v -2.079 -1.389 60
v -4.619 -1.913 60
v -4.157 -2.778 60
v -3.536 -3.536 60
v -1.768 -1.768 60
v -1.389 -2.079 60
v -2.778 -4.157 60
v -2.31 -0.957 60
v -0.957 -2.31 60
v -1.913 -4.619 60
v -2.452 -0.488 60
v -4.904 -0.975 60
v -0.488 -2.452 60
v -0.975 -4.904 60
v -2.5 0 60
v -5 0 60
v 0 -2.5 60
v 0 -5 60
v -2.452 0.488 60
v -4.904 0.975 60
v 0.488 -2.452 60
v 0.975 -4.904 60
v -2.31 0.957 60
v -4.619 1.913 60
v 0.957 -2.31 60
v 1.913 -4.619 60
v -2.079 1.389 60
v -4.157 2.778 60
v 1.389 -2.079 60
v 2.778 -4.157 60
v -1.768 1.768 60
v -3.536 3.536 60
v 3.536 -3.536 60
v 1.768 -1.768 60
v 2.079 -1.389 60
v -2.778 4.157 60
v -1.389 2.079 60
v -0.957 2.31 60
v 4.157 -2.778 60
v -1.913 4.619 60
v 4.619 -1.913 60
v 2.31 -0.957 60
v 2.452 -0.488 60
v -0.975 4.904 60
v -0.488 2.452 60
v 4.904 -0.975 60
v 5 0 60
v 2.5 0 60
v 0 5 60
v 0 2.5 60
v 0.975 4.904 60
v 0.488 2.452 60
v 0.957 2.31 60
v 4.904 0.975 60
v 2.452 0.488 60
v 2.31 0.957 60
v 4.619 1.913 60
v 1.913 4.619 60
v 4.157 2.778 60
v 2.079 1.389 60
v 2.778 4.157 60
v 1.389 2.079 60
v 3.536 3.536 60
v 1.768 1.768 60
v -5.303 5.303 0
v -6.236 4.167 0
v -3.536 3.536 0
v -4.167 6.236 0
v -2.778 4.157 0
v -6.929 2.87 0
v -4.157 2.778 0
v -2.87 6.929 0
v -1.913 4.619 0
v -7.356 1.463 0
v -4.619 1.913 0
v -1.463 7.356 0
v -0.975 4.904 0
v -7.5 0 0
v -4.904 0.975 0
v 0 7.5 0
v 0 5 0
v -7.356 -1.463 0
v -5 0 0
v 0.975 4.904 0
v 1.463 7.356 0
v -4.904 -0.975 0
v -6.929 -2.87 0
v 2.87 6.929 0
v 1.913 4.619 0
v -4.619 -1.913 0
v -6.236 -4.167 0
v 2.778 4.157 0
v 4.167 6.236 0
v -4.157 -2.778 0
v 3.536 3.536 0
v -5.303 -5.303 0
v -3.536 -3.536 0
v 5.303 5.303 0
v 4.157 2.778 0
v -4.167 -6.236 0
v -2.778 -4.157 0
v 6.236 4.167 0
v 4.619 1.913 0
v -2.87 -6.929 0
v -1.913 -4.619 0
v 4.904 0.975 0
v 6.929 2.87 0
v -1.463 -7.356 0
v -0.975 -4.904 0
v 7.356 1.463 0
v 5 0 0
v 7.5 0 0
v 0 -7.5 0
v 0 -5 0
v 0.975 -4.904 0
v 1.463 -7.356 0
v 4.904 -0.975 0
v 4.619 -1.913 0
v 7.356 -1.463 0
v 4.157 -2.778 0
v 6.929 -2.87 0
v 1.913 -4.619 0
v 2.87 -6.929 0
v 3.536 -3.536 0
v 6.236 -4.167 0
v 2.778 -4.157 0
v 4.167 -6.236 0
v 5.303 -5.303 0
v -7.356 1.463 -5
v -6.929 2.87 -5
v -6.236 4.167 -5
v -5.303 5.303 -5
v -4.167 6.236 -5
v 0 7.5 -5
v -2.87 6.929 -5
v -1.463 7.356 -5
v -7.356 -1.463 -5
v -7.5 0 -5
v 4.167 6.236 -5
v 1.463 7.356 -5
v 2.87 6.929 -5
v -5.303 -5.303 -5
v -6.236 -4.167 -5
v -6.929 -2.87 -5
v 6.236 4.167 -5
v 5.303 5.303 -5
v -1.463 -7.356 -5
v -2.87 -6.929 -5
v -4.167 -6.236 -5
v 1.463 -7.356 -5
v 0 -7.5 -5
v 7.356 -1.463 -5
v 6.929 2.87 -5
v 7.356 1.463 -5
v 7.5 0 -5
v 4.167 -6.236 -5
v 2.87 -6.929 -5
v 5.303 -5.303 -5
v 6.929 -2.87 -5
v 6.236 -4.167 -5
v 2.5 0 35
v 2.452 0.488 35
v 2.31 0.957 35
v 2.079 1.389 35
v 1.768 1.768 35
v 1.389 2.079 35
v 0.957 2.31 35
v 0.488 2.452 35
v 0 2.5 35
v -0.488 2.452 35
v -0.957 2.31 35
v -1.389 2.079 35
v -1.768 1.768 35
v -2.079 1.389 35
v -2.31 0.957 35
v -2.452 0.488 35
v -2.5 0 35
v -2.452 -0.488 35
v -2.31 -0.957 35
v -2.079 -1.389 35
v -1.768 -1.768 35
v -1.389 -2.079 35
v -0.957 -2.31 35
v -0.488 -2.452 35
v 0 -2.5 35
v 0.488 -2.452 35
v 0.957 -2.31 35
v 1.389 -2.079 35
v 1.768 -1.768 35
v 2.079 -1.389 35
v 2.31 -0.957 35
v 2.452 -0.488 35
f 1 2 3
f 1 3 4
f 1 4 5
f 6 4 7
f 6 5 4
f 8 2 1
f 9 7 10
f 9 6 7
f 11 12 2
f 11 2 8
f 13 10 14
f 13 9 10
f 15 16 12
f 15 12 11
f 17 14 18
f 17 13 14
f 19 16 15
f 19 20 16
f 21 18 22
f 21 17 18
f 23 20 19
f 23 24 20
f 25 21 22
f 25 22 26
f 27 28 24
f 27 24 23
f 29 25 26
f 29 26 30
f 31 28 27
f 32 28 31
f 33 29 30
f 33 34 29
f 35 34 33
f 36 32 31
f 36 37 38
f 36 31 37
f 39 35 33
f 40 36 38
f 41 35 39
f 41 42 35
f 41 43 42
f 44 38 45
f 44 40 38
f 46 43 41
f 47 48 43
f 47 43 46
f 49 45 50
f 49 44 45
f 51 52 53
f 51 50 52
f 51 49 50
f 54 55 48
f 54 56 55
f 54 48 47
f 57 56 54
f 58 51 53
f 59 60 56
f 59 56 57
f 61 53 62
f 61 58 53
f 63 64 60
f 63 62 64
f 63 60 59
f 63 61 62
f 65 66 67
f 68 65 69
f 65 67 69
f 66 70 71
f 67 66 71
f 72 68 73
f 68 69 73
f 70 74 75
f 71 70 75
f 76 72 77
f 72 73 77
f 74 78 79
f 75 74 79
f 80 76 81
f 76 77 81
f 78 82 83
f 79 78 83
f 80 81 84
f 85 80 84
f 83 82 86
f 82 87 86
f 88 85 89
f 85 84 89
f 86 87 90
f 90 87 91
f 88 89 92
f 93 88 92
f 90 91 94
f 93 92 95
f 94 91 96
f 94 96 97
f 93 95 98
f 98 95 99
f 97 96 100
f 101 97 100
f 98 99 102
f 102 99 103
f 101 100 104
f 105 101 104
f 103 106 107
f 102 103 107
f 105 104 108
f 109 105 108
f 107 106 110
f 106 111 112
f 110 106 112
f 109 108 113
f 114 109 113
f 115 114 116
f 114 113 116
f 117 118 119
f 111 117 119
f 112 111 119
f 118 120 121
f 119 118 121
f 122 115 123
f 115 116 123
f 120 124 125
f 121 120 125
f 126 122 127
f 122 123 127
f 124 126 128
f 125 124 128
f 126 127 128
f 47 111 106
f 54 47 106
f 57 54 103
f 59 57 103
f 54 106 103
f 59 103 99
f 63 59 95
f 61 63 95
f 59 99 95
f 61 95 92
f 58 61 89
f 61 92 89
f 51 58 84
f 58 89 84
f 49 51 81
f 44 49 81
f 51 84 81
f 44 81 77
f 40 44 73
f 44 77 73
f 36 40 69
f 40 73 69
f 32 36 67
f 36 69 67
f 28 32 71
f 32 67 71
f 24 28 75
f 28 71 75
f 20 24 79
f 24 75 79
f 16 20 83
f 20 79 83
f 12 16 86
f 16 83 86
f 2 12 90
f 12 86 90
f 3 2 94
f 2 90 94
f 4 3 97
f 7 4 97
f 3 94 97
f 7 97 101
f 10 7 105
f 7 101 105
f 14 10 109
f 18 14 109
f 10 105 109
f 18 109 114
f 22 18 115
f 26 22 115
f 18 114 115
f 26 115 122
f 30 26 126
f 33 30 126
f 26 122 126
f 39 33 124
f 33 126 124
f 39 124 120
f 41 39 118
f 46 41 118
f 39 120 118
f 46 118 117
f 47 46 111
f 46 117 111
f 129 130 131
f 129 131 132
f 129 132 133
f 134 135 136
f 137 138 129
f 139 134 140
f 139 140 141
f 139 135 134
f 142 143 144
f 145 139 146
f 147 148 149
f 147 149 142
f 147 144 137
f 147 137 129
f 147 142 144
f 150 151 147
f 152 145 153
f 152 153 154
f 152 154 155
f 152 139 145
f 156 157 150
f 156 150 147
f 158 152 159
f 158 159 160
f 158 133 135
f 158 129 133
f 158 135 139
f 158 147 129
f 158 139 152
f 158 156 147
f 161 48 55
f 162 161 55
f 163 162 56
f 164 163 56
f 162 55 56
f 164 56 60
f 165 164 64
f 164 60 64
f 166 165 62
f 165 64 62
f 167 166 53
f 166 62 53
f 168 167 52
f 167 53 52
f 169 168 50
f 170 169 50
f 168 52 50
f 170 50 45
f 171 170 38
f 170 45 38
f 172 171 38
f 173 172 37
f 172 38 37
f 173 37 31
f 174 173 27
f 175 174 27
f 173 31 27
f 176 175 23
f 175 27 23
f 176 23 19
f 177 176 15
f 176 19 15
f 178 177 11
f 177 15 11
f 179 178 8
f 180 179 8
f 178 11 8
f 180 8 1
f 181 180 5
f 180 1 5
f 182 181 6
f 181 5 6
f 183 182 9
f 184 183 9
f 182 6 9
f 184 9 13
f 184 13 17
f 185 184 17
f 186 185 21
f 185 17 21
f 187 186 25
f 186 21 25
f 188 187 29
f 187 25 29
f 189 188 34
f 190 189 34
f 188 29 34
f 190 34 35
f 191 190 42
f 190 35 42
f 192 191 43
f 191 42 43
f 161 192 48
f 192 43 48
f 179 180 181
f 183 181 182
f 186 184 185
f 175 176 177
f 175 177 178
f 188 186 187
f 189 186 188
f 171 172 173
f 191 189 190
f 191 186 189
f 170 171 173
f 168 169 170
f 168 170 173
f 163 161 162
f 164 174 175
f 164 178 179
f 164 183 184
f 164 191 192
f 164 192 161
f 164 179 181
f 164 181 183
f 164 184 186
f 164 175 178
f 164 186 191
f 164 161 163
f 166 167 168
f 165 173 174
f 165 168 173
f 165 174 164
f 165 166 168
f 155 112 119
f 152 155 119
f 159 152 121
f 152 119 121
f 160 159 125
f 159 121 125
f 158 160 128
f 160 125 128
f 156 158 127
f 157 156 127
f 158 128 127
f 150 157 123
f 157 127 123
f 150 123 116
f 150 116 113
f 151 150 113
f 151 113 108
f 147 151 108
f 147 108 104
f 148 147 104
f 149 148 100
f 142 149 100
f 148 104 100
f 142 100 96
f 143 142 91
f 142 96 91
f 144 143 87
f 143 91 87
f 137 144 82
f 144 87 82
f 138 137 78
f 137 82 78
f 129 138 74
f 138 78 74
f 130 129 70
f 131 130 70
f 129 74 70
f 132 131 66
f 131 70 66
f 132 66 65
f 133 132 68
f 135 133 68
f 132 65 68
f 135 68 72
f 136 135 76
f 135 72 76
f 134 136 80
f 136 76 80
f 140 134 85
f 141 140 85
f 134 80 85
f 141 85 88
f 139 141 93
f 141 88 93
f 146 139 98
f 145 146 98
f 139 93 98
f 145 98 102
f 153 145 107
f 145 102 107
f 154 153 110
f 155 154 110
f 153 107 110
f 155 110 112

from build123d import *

# Parameters (mm, degrees)
F0_R     = 5
F1_DEPTH = 60
F2_R     = 7.5
F2_R_2   = 5
F3_DEPTH = 5
F4_R     = 2.5
F5_DEPTH = 25


with BuildPart() as f1:
    # F0 (on Top) → F1 (new body)
    with BuildSketch(Plane.XY):
        Circle(F0_R)
    extrude(amount=F1_DEPTH)

    # F2 (on face) → F3 (join)
    with BuildSketch(Plane(origin=(0, 0, 0), x_dir=(1, 0, 0), z_dir=(0, 0, -1))):
        Circle(F2_R)
        Circle(F2_R_2, mode=Mode.SUBTRACT)
        Circle(F2_R_2)
    extrude(amount=F3_DEPTH)

    # F4 (on face) → F5 (cut)
    with BuildSketch(Plane.XY.offset(60)):
        Circle(F4_R)
    extrude(amount=-F5_DEPTH, mode=Mode.SUBTRACT)


solid = f1.part
